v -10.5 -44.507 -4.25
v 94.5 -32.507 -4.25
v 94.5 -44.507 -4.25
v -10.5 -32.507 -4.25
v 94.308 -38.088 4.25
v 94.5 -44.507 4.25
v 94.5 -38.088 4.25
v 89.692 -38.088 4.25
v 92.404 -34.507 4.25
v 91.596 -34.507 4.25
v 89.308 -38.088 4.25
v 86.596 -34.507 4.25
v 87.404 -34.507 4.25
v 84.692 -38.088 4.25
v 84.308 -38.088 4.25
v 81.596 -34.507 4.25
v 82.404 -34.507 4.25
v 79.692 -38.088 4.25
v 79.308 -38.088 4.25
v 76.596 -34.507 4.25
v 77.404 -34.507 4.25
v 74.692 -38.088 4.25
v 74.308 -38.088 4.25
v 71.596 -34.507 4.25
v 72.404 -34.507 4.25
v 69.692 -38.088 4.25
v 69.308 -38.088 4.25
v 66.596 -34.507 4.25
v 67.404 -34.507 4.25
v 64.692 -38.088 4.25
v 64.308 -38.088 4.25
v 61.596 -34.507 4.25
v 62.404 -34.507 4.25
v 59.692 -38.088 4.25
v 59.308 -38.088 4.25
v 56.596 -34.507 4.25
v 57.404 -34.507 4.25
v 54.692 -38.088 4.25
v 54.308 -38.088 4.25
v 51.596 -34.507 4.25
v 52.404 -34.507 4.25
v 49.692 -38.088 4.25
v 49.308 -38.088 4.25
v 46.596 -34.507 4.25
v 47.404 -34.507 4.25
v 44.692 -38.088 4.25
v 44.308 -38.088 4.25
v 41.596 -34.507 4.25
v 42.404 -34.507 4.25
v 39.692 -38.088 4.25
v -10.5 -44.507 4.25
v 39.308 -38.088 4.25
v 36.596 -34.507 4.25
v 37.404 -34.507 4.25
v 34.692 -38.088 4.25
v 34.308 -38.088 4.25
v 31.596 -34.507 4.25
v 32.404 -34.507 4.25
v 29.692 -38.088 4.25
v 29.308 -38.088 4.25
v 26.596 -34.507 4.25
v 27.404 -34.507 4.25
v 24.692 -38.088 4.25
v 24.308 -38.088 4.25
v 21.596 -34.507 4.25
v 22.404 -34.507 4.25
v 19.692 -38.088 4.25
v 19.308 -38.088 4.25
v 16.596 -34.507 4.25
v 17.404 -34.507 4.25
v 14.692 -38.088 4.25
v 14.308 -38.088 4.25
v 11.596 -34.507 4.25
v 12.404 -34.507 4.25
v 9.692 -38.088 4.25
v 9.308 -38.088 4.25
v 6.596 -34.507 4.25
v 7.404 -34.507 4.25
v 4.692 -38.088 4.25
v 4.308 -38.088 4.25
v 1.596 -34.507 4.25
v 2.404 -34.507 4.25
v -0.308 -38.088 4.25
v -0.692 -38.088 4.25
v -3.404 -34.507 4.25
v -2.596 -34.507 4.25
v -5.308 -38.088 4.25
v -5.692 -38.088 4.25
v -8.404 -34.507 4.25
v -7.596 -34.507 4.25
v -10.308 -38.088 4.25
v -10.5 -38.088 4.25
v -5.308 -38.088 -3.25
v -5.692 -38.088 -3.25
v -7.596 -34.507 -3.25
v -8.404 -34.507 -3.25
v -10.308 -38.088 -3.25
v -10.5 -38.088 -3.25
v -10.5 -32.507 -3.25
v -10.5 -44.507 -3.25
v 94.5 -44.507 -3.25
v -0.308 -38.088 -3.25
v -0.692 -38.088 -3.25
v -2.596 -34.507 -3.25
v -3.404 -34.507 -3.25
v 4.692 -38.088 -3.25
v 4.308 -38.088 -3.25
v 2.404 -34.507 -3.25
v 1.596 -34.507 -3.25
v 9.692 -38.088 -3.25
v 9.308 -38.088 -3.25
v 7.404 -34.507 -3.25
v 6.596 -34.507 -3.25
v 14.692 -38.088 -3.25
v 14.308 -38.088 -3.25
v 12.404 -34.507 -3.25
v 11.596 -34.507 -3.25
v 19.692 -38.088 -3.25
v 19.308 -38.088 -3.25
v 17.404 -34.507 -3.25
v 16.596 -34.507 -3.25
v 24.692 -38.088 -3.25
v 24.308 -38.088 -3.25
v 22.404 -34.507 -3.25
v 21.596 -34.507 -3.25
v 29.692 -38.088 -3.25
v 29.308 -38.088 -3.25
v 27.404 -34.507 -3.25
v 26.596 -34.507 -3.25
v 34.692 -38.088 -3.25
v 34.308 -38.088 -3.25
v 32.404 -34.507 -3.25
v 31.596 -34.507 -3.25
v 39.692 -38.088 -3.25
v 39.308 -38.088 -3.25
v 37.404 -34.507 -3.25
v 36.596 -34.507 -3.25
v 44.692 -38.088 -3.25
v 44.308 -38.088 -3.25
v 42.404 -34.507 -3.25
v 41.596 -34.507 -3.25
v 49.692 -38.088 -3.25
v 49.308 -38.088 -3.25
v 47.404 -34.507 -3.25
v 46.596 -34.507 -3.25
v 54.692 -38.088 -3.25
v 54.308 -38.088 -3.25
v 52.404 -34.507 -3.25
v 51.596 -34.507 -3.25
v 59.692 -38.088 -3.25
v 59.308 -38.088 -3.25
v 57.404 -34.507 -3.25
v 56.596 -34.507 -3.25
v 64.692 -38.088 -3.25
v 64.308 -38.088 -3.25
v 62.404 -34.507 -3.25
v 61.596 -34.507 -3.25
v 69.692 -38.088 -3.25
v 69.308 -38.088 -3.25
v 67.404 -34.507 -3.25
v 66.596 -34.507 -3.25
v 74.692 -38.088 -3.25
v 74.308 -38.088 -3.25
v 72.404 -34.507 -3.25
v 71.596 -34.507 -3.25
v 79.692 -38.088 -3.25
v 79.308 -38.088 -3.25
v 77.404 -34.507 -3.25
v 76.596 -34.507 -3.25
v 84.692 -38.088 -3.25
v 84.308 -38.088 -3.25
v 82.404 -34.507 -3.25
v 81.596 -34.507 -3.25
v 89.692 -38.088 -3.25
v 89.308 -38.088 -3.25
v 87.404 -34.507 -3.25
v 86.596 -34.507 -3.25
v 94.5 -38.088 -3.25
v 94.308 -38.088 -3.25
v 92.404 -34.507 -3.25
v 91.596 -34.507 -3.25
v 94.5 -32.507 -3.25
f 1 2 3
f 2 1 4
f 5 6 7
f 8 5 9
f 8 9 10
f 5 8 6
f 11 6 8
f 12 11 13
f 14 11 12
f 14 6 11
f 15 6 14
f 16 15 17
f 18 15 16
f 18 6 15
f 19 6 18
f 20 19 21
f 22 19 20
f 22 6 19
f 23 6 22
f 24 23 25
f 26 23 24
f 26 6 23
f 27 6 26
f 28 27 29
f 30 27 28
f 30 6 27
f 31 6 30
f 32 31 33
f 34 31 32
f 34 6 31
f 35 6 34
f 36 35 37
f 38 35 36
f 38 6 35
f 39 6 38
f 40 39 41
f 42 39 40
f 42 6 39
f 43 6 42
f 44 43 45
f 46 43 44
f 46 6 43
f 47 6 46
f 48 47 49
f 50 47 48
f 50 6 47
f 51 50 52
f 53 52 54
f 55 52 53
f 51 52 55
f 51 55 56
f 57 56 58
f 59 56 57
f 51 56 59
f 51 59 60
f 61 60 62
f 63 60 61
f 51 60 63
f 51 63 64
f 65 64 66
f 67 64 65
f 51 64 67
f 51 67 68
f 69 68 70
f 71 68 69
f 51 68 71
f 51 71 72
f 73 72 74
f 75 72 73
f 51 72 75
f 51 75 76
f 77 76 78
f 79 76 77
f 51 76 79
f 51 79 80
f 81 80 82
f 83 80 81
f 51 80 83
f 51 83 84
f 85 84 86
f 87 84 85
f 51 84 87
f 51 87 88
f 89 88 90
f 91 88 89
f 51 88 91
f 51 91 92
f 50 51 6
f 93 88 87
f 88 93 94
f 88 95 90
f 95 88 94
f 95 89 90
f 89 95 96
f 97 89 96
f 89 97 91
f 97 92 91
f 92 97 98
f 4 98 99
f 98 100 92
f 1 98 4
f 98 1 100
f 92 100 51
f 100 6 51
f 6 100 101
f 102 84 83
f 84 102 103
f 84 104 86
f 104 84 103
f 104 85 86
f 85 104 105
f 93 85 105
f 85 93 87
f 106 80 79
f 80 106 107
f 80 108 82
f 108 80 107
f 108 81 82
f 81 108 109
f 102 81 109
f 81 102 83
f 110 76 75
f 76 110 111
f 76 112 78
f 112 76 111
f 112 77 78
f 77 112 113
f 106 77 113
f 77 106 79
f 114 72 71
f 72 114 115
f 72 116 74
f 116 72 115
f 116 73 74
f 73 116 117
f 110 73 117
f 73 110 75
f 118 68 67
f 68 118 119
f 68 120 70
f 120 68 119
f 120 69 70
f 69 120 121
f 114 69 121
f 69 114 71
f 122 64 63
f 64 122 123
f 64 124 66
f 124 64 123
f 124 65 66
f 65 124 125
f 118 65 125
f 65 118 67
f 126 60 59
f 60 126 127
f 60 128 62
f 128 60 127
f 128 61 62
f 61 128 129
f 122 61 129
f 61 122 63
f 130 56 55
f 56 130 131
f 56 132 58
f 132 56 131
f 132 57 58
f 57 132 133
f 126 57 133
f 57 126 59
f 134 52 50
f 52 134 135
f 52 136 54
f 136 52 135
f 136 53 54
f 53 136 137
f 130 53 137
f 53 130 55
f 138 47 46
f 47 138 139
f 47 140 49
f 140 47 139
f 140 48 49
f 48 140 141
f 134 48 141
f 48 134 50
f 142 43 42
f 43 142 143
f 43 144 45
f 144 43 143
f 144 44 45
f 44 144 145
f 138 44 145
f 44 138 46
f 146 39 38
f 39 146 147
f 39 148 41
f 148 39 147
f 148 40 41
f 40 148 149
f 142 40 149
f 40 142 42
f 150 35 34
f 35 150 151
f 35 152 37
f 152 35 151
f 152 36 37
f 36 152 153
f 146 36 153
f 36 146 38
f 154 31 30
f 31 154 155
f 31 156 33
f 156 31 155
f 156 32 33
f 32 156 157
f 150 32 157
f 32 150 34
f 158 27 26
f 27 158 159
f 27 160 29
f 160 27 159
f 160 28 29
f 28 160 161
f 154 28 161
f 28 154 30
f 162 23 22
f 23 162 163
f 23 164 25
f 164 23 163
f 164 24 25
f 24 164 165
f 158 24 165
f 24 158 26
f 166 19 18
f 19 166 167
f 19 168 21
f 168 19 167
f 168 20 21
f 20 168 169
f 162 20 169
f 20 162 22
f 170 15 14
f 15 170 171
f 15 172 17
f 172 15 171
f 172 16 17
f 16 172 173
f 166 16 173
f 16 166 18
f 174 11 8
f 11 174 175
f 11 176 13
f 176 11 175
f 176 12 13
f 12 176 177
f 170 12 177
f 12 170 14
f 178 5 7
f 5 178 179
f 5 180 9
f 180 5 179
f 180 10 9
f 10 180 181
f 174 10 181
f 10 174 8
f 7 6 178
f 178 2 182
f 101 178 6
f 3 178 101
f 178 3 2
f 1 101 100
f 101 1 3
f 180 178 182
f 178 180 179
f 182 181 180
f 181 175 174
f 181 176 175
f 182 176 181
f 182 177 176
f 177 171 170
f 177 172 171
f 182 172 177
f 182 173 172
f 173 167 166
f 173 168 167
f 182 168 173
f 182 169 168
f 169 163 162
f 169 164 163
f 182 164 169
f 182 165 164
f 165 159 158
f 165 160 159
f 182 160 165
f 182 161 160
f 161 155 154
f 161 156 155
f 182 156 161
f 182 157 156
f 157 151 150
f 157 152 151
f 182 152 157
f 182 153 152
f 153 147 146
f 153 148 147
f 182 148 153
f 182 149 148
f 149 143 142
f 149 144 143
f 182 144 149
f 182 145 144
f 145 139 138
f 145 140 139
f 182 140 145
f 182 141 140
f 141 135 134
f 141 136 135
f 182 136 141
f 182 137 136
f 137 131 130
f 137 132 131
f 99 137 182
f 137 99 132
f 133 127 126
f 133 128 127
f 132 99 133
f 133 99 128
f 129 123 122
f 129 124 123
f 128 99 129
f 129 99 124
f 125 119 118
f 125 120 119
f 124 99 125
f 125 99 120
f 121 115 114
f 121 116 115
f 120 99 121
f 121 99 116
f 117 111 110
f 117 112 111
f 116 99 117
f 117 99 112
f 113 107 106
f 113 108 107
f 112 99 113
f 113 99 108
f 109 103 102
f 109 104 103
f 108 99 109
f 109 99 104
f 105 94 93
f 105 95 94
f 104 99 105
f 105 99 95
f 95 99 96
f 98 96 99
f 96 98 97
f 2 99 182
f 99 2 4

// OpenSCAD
// file: sled_bottom.scad
function rel_to_abs(list, i = 0, sum = [0,0], result = []) = 
    i == len(list) ? result : rel_to_abs(list, i + 1, sum + list[i], concat(result, [sum + list[i]]));
    

module doubleHoles() {
cylinder(h = 20, r = 1.75, $fn=20);
translate([7,0,0]) cylinder(h = 20, r = 1.75, $fn=20);
}

module doubleHoles6mm() {
cylinder(h = 5, r = 3, $fn=20);
translate([7,0,0]) cylinder(h = 5, r = 3, $fn=20);
}

difference() {
  linear_extrude(7.5) polygon(rel_to_abs([[0,0],[70.5,0],[0,17],[-70.5,0]]));

  rotate([0,0,90]) translate([3.5, -3.75, -1]) doubleHoles();
  rotate([0,0,90]) translate([3.5, -66.75, -1]) doubleHoles();
    
  rotate([0,0,90]) translate([3.5, -3.75, -1]) doubleHoles6mm();
  rotate([0,0,90]) translate([3.5, -66.75, -1]) doubleHoles6mm();
    
  linear_extrude(2) polygon(rel_to_abs([[0,0],[70.5,0],[0,12.5],[-70.5,0]]));

}

translate([50.5,-20,2]) limit_switch_protrusion();
translate([0,-7.5,-6.8]) back();

module limit_switch_protrusion() {
    difference() {
        cube(size = [20,20,5.5]);
        translate([3.5,5.5,0]) cylinder(h = 20, r = 2.1/2, $fn=20);
        translate([3.5,15,0]) cylinder(h = 20, r = 2.1/2, $fn=20);

    }
}

module back() {
    difference() {
        cube(size = [45,7.5,14.3]);
        translate([3.75,3.75,0]) cylinder(h = 20, r = 2.7/2, $fn=20);
        translate([41.25,3.75,0]) cylinder(h = 20, r = 2.7/2, $fn=20);

    }
}
// main file
include<rack_renamed.scad>


/*translate([27,20,30+1])rotate([0,180,0])
difference(){
import("pinion.stl");
translate([7,0,-5])cylinder(r=3.2/2,h=30,$fn=30);
translate([-7,0,-5])cylinder(r=3.2/2,h=30,$fn=30);
}
*/

/*
include <sled_bottom.scad>
include <holder_half.scad>
include <rack_renamed.scad>
include <holder_half.scad>
*/
//translate([50,0,0]){include <sled_cap.scad>}

//servo_linear_assy();

module holder_half_mod(){

difference(){
union(){
import("/Users/richard/Documents/dr.robot/dr.robotlab_library/MG995_Servo_Linear_Actuator/files/holder_half.stl");
//color("pink")translate([-66.8-7.8,13.5,44])cube([6+1.5,30,10]);
//color("pink")translate([-66.8-7.8,13.5,44+10-2])cube([6+1.5,40,12]);
}

translate([-30-70+25,2-5,71])rotate([0,90,0]){
translate([7-4,35,-2])cylinder(r=3.8/2,h=200,$fn=30);
translate([7-4,35,-0])cylinder(r=8/2,h=3,$fn=30);
translate([7+7,41+11.25,-2])cylinder(r=3.8/2,h=200,$fn=30);
translate([7+7,41+11.25,-0])cylinder(r=8/2,h=3,$fn=30);
translate([7+18,35,-2])cylinder(r=3.8/2,h=200,$fn=30);
translate([7+18,35,-0])cylinder(r=8/2,h=3,$fn=30);
}


}
}



module sled_cap(){

translate([45,0,0]) cube(size = [25.5,7.5,1.2]);

difference() {
    union(){
    translate([0,0,-3]) cube(size = [70.5,10.5,3]);
    #translate([0,0+7.7,-3]) cube(size = [70.5,2.75,3.2]);
    }
    translate([3.75,3.75,-8]) cylinder(h = 20, r = 1.75, $fn=20);
    translate([41.25,3.75,-8]) cylinder(h = 20, r = 1.75, $fn=20);
}

difference() {
    cube(size = [45,7.5,0.2]);
    translate([3.75,3.75,-8]) cylinder(h = 20, r = 1.75, $fn=20);
    translate([41.25,3.75,-8]) cylinder(h = 20, r = 1.75, $fn=20);
}

}


module servo_linear_assy(){
//translate([54,100-30+0.5,0])rotate([0,0,0])import("/Users/richard/Documents/dr.robot/dr.robotlab_library/MG995_Servo_Linear_Actuator/files/holder_half.stl");
//translate([34.5,109.5,63])rotate([0,180,-90])import("/Users/richard/Documents/dr.robot/dr.robotlab_library/MG995_Servo_Linear_Actuator/files/holder_half.stl");

translate([34.5,109.5,63])rotate([0,180,-90])holder_half_mod();
translate([70-8.5,70.7,34.5])rotate([0,180,90])sled_cap();
translate([70-8.5-68,70.7,34.5])rotate([0,180,90])mirror([0,1,0])sled_cap();


translate([34.5-14,109.5-149,63])rotate([0,180,90])import("/Users/richard/Documents/dr.robot/dr.robotlab_library/MG995_Servo_Linear_Actuator/files/holder_half.stl");

/*
difference(){
translate([54,100-30+0.5,0])rotate([0,0,180])import("/Users/richard/Documents/dr.robot/dr.robotlab_library/MG995_Servo_Linear_Actuator/files/holder_half.stl");
translate([36,100-30+0.5+50,0+11])rotate([90,0,0])cylinder(r=2.8/2,h=120,$fn=30);
translate([36-18,100-30+0.5+50,0+11])rotate([90,0,0])cylinder(r=2.8/2,h=120,$fn=30);
}
*/
//translate([54-54,-0,0])rotate([0,0,0])import("/Users/richard/Documents/dr.robot/dr.robotlab_library/MG995_Servo_Linear_Actuator/files/holder_half.stl");

translate([50+4,-50+120+0.5,27.5])color("lime")rotate([0,180,90])import("/Users/richard/Documents/dr.robot/dr.robotlab_library/MG995_Servo_Linear_Actuator/files/sled_bottom.stl");

translate([50+4-53,-50+120+0.5,27.5])color("lime")rotate([0,180,90])mirror([0,1,0])import("/Users/richard/Documents/dr.robot/dr.robotlab_library/MG995_Servo_Linear_Actuator/files/sled_bottom.stl");


//translate([10-1,-10-15+20,30])rotate([0,0,90])color("pink")import("/Users/richard/Documents/dr.robot/dr.robotlab_library/MG995_Servo_Linear_Actuator/files/rack.stl");
translate([10-1,-10-15+20,30])rotate([0,0,90])color("")rack();

//translate([10-1+37,-10-15+20,30])rotate([0,0,90])mirror([0,1,0])color("pink")import("/Users/richard/Documents/dr.robot/dr.robotlab_library/MG995_Servo_Linear_Actuator/files/rack.stl");
translate([10-1+37,-10-15+20,30])rotate([0,0,90])mirror([0,1,0])color("")rack();
translate([0,4,-0])rotate([0,0,0])
difference(){
color("peru")import("/Users/richard/Documents/dr.robot/dr.robotlab_library/MG995_Servo_Linear_Actuator/files/pinion.stl");
}
translate([37,14-0,-12])rotate([0,0,90])servo();
}

module servo(){
 bcl = 0.4;
 color([bcl,bcl,bcl])
 cube([40.75,19.85,35]);
 difference(){
 color([bcl,bcl,bcl])translate([-(55.5-40.74)/2,0,35-8])cube([55.5,19.85,2.5]);
 translate([-(55.5-40.74)/2+3.8,0+4.5,35-8-10])cylinder(r=3.7/2,h=20);
 translate([-(55.5-40.74)/2+3.8,0+4.5+10,35-8-10])cylinder(r=3.7/2,h=20);
 translate([-(55.5-40.74)/2+3.8+49,0+4.5,35-8-10])cylinder(r=3.7/2,h=20);
 translate([-(55.5-40.74)/2+3.8+49,0+4.5+10,35-8-10])cylinder(r=3.7/2,h=20);
 }
/*
*/ 
 cl = 0.9;
 color([cl,cl,cl]){
 translate([10,10,30])cylinder(r=8/2,h=14);
 translate([10,10,41-6+8])difference(){
  cylinder(r=21/2,h=2);
  translate([0,7,-4])cylinder(r=2.6/2,h=20,$fn=30);
  translate([0,-7,-4])cylinder(r=2.6/2,h=20,$fn=30);
 }
 }
}
